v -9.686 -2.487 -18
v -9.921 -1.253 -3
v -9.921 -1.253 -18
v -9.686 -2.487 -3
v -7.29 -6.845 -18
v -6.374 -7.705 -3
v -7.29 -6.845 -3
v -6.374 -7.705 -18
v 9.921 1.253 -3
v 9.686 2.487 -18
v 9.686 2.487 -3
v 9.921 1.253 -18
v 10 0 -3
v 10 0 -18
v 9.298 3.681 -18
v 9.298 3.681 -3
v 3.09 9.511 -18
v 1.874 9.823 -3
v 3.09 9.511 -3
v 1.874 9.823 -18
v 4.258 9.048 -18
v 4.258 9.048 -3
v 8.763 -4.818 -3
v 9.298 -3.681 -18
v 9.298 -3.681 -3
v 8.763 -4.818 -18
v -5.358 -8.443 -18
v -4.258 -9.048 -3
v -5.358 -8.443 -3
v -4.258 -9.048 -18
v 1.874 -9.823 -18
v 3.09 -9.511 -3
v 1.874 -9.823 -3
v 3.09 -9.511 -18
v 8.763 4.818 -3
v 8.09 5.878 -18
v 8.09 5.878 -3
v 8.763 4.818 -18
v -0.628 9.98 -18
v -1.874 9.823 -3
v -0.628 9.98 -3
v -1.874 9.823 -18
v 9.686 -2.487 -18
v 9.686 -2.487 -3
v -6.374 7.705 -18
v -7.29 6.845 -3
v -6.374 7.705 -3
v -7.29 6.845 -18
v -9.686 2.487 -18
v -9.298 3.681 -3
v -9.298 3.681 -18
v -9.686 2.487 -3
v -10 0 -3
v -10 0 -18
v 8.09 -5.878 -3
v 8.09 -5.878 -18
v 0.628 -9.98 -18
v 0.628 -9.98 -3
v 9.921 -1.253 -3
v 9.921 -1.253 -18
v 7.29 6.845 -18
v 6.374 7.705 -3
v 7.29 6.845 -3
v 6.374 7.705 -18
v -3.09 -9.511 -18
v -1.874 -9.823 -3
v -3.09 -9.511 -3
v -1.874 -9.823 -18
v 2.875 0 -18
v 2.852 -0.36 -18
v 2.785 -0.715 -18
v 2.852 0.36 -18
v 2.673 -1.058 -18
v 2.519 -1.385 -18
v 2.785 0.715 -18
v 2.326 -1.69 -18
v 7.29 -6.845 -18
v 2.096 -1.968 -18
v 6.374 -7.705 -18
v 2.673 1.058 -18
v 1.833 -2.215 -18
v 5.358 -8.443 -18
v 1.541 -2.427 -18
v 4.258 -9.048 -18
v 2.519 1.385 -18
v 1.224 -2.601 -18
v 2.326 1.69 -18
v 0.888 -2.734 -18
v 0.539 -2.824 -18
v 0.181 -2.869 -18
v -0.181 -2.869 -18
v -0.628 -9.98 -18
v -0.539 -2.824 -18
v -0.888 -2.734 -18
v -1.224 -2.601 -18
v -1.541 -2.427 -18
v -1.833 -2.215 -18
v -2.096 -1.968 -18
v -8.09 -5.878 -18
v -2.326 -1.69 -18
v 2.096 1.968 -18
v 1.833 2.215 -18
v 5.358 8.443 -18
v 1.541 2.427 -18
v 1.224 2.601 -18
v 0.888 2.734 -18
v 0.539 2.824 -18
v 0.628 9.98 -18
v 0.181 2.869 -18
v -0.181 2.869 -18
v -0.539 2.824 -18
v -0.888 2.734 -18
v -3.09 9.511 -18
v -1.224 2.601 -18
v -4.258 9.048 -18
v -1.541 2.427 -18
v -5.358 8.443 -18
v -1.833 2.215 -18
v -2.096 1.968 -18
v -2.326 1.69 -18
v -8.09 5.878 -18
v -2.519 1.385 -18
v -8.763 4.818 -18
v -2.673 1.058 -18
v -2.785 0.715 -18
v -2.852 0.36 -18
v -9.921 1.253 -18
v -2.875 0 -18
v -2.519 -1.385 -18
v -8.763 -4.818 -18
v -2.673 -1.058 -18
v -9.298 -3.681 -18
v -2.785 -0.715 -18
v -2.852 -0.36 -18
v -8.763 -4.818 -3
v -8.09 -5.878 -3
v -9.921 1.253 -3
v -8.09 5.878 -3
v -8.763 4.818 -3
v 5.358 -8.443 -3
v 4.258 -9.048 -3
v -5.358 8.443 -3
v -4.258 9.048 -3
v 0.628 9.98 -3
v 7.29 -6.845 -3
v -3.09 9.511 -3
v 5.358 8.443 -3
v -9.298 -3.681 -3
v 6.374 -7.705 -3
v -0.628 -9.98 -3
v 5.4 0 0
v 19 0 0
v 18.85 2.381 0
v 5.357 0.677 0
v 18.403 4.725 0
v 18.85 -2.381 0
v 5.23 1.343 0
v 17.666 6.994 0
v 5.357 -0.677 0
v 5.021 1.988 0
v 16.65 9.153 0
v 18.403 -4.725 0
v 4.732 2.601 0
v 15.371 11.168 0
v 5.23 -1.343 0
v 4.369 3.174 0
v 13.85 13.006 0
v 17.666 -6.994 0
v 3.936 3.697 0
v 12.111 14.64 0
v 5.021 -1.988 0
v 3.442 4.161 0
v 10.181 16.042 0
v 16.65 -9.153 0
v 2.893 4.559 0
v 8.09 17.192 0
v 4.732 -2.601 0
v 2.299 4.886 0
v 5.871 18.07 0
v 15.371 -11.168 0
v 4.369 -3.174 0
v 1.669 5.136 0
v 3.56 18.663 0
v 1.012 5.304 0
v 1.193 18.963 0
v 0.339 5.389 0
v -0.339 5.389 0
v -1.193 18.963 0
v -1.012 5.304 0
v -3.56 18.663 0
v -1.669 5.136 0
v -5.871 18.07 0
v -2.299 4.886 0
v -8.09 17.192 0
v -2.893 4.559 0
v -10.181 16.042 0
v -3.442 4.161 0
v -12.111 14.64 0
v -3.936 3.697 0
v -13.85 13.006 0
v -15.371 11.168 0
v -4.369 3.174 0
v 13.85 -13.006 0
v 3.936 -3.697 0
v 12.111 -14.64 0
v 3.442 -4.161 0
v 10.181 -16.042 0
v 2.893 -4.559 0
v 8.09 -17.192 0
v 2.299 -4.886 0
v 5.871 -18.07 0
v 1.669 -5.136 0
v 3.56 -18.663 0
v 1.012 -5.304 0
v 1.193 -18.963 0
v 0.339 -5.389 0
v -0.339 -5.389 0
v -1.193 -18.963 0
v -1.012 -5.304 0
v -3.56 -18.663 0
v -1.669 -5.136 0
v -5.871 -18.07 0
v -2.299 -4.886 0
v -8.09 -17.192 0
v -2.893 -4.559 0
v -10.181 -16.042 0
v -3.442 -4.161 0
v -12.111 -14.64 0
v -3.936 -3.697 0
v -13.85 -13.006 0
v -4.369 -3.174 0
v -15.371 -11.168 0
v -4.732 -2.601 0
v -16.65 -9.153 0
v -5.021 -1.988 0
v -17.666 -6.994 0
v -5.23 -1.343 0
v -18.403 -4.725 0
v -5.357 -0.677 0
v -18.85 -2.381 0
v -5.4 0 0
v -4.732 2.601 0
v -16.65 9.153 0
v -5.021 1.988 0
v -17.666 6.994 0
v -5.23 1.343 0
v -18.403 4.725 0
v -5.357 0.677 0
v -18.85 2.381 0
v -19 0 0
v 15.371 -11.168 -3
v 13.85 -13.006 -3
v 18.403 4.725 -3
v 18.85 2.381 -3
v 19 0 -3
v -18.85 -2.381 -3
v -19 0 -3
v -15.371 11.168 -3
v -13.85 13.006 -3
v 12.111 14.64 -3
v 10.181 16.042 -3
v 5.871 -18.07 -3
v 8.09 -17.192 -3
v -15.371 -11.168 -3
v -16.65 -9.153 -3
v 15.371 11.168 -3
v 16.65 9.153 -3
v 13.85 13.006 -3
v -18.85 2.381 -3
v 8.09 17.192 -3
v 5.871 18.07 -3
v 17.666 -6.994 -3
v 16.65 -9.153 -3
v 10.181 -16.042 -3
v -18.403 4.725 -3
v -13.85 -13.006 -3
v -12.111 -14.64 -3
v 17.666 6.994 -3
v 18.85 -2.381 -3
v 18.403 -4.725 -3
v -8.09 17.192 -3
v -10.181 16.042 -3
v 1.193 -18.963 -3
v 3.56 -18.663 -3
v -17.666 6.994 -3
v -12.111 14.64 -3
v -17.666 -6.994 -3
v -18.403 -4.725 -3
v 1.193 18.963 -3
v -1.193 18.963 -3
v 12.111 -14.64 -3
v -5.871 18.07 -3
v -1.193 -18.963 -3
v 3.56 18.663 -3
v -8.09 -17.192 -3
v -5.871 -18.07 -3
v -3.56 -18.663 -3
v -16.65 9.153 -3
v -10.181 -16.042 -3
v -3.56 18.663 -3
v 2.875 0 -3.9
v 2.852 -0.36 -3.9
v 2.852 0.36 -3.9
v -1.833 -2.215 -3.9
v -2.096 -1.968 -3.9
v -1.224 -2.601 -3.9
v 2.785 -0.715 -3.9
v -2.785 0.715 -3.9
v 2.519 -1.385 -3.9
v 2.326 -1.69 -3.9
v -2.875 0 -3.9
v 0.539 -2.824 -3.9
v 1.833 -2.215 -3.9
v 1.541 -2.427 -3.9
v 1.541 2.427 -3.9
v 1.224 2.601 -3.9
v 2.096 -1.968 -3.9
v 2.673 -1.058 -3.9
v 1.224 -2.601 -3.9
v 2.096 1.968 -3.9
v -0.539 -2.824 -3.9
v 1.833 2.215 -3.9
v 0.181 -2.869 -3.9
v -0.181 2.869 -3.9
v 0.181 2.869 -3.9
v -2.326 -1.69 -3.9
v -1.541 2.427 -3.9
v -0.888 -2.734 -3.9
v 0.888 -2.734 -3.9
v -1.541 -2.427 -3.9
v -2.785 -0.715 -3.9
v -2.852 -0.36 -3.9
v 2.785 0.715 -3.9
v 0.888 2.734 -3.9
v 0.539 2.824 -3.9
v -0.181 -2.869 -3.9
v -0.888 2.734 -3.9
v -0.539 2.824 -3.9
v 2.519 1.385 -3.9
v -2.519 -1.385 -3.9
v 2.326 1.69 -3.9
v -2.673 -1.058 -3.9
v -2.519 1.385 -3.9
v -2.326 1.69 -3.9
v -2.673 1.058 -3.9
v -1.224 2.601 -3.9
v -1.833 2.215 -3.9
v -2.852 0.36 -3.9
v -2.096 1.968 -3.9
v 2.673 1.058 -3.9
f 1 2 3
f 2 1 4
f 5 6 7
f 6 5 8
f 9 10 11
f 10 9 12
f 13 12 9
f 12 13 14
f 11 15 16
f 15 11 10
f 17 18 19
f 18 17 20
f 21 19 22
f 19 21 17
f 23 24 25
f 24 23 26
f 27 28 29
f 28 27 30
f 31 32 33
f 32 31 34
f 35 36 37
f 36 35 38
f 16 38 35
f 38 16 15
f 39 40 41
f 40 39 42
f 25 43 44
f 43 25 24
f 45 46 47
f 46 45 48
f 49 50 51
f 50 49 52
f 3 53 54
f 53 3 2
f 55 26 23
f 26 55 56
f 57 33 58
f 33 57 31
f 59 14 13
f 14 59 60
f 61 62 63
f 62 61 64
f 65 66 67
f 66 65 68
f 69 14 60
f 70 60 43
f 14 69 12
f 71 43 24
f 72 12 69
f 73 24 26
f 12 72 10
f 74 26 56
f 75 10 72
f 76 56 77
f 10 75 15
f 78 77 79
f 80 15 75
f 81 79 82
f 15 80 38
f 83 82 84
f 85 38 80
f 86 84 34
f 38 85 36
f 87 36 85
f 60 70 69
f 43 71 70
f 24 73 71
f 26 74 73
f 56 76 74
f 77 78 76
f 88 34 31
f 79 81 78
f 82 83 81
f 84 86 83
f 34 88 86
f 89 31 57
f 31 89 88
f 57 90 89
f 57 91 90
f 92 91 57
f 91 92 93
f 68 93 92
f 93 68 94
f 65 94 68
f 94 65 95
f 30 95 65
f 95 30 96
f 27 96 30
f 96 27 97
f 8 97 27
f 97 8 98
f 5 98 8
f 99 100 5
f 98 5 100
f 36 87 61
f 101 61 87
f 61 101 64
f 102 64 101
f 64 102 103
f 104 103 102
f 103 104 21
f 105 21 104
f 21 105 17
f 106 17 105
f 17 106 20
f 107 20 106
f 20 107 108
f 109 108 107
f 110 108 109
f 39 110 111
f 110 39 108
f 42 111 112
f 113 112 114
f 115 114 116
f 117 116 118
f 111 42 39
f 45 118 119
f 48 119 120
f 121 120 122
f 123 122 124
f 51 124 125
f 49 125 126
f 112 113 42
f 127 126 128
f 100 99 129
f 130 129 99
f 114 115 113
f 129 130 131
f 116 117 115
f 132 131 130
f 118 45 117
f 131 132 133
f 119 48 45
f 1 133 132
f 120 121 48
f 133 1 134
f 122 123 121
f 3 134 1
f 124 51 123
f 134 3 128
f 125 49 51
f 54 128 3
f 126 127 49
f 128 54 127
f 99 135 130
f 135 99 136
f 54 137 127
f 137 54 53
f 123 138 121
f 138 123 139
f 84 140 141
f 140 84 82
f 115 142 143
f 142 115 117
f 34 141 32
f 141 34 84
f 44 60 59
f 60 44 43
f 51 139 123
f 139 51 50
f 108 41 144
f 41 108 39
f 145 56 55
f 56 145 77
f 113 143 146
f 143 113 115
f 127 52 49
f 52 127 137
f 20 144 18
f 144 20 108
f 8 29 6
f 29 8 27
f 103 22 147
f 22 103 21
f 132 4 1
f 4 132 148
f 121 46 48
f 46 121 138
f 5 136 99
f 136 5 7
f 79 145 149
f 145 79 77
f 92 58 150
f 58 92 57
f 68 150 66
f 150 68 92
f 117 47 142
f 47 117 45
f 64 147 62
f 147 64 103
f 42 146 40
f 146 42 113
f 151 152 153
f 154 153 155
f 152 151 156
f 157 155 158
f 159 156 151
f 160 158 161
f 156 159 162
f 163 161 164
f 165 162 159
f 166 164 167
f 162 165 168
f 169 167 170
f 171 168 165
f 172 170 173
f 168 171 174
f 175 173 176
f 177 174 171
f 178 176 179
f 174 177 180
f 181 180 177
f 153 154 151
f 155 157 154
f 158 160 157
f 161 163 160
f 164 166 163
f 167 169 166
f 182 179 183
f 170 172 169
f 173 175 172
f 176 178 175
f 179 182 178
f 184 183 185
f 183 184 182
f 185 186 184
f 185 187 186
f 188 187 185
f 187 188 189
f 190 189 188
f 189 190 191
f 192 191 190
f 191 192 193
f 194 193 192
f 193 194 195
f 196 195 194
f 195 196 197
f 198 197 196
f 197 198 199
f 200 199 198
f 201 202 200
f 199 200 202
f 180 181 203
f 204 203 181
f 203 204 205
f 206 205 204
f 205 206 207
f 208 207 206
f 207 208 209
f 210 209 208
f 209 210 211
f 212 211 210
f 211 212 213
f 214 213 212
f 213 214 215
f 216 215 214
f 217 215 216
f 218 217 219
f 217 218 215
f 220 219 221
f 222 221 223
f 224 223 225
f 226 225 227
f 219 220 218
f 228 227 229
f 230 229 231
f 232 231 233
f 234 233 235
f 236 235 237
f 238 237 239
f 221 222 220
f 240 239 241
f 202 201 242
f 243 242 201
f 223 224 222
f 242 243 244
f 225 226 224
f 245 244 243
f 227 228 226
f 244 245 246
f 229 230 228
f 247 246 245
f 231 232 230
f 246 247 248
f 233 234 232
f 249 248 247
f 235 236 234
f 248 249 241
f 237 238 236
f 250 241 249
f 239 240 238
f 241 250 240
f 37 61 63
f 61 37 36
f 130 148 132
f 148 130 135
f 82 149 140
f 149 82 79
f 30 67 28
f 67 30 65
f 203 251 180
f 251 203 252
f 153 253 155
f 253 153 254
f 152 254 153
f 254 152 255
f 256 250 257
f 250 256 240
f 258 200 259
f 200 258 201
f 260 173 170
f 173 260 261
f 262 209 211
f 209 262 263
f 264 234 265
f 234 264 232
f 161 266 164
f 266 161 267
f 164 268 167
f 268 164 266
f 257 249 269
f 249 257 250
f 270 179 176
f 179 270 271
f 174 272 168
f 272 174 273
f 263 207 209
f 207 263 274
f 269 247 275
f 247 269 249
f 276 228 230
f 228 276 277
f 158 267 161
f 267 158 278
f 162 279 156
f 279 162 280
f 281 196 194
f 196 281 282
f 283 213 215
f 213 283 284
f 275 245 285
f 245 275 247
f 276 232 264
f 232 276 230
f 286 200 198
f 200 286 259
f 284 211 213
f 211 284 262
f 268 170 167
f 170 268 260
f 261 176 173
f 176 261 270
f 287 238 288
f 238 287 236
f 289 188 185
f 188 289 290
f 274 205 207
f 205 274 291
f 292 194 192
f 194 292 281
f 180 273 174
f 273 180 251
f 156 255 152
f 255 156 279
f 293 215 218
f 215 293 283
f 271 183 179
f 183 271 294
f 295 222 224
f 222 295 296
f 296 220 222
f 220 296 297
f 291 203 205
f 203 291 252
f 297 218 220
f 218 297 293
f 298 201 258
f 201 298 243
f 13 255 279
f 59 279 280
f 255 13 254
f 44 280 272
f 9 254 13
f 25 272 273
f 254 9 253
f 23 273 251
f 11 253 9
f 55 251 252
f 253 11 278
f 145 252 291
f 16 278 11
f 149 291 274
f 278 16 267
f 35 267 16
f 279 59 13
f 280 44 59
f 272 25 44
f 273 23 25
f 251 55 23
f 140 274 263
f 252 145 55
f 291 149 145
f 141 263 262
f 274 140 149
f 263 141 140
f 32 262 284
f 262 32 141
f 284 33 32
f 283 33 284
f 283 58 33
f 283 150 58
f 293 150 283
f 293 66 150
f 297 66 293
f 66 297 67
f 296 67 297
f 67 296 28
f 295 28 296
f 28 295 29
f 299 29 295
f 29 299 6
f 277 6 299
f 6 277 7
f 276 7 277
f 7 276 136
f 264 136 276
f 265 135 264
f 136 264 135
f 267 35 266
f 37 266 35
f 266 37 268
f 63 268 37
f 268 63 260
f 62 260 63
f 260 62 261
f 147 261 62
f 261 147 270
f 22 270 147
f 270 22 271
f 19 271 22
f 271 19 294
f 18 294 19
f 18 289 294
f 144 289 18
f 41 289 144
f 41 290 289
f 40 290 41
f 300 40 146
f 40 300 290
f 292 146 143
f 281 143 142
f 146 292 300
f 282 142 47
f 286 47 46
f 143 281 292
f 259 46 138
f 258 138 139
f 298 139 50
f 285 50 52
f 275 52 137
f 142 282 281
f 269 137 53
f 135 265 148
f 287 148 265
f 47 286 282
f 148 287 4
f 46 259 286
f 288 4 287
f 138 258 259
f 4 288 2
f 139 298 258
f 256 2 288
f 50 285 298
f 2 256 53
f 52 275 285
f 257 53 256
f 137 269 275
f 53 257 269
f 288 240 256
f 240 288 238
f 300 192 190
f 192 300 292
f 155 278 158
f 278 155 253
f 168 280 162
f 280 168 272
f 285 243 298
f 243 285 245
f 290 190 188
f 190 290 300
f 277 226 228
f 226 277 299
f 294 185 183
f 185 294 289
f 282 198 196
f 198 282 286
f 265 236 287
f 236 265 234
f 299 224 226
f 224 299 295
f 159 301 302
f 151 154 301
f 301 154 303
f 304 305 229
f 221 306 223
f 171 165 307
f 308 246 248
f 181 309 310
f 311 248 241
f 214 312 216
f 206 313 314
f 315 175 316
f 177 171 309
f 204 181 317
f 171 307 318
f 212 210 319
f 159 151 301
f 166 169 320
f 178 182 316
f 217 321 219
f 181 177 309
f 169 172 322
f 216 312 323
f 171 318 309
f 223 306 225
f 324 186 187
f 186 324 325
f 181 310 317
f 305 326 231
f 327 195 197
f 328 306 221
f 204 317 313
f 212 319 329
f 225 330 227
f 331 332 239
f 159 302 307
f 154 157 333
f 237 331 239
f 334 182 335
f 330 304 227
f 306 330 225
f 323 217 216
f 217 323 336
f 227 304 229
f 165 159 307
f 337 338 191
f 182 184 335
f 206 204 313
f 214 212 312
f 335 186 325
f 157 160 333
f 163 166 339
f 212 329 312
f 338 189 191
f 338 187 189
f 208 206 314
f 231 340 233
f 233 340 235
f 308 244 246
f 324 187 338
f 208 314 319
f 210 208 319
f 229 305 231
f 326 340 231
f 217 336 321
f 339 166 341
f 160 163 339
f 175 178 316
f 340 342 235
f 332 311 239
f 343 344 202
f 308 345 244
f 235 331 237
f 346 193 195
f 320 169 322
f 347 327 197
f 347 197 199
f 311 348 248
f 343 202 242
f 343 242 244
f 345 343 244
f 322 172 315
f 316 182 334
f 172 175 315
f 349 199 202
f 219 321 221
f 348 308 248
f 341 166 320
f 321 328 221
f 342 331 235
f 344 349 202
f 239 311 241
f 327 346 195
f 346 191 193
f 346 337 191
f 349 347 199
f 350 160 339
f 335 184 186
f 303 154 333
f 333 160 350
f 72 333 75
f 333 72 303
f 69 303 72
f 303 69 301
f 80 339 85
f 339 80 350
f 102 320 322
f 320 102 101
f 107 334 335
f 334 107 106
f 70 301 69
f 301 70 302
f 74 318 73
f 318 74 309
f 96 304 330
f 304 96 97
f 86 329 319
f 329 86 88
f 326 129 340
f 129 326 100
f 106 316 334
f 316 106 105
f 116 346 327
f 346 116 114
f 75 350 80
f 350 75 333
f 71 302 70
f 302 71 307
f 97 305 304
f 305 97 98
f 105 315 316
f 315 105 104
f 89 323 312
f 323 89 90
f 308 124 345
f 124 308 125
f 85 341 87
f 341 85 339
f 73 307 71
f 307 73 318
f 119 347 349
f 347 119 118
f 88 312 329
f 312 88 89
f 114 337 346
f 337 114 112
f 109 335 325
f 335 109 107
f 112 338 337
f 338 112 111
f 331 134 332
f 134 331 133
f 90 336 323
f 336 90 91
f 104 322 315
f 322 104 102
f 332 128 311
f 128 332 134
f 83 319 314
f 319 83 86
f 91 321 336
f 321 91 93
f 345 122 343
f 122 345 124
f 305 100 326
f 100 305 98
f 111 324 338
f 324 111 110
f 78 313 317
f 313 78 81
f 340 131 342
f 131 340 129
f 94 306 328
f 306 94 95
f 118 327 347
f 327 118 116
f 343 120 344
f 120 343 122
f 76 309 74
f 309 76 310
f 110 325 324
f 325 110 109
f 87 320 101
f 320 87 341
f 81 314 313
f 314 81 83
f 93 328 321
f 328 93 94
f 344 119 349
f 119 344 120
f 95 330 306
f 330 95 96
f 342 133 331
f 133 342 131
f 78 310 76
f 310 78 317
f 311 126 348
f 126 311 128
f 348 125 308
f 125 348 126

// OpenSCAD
$fn = 50;


difference() {
	union() {
		translate(v = [0, 0, -18.0000000000]) {
			cylinder(h = 18, r = 10.0000000000);
		}
		translate(v = [0, 0, -3.0000000000]) {
			cylinder(h = 3, r = 19.0000000000);
		}
	}
	union() {
		translate(v = [0, 0, 0]) {
			rotate(a = [0, 0, 0]) {
				difference() {
					union() {
						#translate(v = [0, 0, -18.0000000000]) {
							cylinder(h = 18, r = 2.6000000000);
						}
						#translate(v = [0, 0, -3.9000000000]) {
							cylinder(h = 3.9000000000, r1 = 2.8750000000, r2 = 5.4000000000);
						}
						#translate(v = [0, 0, -18.0000000000]) {
							cylinder(h = 18, r = 2.8750000000);
						}
						#translate(v = [0, 0, -18.0000000000]) {
							cylinder(h = 18, r = 2.6000000000);
						}
					}
					union();
				}
			}
		}
	}
}
